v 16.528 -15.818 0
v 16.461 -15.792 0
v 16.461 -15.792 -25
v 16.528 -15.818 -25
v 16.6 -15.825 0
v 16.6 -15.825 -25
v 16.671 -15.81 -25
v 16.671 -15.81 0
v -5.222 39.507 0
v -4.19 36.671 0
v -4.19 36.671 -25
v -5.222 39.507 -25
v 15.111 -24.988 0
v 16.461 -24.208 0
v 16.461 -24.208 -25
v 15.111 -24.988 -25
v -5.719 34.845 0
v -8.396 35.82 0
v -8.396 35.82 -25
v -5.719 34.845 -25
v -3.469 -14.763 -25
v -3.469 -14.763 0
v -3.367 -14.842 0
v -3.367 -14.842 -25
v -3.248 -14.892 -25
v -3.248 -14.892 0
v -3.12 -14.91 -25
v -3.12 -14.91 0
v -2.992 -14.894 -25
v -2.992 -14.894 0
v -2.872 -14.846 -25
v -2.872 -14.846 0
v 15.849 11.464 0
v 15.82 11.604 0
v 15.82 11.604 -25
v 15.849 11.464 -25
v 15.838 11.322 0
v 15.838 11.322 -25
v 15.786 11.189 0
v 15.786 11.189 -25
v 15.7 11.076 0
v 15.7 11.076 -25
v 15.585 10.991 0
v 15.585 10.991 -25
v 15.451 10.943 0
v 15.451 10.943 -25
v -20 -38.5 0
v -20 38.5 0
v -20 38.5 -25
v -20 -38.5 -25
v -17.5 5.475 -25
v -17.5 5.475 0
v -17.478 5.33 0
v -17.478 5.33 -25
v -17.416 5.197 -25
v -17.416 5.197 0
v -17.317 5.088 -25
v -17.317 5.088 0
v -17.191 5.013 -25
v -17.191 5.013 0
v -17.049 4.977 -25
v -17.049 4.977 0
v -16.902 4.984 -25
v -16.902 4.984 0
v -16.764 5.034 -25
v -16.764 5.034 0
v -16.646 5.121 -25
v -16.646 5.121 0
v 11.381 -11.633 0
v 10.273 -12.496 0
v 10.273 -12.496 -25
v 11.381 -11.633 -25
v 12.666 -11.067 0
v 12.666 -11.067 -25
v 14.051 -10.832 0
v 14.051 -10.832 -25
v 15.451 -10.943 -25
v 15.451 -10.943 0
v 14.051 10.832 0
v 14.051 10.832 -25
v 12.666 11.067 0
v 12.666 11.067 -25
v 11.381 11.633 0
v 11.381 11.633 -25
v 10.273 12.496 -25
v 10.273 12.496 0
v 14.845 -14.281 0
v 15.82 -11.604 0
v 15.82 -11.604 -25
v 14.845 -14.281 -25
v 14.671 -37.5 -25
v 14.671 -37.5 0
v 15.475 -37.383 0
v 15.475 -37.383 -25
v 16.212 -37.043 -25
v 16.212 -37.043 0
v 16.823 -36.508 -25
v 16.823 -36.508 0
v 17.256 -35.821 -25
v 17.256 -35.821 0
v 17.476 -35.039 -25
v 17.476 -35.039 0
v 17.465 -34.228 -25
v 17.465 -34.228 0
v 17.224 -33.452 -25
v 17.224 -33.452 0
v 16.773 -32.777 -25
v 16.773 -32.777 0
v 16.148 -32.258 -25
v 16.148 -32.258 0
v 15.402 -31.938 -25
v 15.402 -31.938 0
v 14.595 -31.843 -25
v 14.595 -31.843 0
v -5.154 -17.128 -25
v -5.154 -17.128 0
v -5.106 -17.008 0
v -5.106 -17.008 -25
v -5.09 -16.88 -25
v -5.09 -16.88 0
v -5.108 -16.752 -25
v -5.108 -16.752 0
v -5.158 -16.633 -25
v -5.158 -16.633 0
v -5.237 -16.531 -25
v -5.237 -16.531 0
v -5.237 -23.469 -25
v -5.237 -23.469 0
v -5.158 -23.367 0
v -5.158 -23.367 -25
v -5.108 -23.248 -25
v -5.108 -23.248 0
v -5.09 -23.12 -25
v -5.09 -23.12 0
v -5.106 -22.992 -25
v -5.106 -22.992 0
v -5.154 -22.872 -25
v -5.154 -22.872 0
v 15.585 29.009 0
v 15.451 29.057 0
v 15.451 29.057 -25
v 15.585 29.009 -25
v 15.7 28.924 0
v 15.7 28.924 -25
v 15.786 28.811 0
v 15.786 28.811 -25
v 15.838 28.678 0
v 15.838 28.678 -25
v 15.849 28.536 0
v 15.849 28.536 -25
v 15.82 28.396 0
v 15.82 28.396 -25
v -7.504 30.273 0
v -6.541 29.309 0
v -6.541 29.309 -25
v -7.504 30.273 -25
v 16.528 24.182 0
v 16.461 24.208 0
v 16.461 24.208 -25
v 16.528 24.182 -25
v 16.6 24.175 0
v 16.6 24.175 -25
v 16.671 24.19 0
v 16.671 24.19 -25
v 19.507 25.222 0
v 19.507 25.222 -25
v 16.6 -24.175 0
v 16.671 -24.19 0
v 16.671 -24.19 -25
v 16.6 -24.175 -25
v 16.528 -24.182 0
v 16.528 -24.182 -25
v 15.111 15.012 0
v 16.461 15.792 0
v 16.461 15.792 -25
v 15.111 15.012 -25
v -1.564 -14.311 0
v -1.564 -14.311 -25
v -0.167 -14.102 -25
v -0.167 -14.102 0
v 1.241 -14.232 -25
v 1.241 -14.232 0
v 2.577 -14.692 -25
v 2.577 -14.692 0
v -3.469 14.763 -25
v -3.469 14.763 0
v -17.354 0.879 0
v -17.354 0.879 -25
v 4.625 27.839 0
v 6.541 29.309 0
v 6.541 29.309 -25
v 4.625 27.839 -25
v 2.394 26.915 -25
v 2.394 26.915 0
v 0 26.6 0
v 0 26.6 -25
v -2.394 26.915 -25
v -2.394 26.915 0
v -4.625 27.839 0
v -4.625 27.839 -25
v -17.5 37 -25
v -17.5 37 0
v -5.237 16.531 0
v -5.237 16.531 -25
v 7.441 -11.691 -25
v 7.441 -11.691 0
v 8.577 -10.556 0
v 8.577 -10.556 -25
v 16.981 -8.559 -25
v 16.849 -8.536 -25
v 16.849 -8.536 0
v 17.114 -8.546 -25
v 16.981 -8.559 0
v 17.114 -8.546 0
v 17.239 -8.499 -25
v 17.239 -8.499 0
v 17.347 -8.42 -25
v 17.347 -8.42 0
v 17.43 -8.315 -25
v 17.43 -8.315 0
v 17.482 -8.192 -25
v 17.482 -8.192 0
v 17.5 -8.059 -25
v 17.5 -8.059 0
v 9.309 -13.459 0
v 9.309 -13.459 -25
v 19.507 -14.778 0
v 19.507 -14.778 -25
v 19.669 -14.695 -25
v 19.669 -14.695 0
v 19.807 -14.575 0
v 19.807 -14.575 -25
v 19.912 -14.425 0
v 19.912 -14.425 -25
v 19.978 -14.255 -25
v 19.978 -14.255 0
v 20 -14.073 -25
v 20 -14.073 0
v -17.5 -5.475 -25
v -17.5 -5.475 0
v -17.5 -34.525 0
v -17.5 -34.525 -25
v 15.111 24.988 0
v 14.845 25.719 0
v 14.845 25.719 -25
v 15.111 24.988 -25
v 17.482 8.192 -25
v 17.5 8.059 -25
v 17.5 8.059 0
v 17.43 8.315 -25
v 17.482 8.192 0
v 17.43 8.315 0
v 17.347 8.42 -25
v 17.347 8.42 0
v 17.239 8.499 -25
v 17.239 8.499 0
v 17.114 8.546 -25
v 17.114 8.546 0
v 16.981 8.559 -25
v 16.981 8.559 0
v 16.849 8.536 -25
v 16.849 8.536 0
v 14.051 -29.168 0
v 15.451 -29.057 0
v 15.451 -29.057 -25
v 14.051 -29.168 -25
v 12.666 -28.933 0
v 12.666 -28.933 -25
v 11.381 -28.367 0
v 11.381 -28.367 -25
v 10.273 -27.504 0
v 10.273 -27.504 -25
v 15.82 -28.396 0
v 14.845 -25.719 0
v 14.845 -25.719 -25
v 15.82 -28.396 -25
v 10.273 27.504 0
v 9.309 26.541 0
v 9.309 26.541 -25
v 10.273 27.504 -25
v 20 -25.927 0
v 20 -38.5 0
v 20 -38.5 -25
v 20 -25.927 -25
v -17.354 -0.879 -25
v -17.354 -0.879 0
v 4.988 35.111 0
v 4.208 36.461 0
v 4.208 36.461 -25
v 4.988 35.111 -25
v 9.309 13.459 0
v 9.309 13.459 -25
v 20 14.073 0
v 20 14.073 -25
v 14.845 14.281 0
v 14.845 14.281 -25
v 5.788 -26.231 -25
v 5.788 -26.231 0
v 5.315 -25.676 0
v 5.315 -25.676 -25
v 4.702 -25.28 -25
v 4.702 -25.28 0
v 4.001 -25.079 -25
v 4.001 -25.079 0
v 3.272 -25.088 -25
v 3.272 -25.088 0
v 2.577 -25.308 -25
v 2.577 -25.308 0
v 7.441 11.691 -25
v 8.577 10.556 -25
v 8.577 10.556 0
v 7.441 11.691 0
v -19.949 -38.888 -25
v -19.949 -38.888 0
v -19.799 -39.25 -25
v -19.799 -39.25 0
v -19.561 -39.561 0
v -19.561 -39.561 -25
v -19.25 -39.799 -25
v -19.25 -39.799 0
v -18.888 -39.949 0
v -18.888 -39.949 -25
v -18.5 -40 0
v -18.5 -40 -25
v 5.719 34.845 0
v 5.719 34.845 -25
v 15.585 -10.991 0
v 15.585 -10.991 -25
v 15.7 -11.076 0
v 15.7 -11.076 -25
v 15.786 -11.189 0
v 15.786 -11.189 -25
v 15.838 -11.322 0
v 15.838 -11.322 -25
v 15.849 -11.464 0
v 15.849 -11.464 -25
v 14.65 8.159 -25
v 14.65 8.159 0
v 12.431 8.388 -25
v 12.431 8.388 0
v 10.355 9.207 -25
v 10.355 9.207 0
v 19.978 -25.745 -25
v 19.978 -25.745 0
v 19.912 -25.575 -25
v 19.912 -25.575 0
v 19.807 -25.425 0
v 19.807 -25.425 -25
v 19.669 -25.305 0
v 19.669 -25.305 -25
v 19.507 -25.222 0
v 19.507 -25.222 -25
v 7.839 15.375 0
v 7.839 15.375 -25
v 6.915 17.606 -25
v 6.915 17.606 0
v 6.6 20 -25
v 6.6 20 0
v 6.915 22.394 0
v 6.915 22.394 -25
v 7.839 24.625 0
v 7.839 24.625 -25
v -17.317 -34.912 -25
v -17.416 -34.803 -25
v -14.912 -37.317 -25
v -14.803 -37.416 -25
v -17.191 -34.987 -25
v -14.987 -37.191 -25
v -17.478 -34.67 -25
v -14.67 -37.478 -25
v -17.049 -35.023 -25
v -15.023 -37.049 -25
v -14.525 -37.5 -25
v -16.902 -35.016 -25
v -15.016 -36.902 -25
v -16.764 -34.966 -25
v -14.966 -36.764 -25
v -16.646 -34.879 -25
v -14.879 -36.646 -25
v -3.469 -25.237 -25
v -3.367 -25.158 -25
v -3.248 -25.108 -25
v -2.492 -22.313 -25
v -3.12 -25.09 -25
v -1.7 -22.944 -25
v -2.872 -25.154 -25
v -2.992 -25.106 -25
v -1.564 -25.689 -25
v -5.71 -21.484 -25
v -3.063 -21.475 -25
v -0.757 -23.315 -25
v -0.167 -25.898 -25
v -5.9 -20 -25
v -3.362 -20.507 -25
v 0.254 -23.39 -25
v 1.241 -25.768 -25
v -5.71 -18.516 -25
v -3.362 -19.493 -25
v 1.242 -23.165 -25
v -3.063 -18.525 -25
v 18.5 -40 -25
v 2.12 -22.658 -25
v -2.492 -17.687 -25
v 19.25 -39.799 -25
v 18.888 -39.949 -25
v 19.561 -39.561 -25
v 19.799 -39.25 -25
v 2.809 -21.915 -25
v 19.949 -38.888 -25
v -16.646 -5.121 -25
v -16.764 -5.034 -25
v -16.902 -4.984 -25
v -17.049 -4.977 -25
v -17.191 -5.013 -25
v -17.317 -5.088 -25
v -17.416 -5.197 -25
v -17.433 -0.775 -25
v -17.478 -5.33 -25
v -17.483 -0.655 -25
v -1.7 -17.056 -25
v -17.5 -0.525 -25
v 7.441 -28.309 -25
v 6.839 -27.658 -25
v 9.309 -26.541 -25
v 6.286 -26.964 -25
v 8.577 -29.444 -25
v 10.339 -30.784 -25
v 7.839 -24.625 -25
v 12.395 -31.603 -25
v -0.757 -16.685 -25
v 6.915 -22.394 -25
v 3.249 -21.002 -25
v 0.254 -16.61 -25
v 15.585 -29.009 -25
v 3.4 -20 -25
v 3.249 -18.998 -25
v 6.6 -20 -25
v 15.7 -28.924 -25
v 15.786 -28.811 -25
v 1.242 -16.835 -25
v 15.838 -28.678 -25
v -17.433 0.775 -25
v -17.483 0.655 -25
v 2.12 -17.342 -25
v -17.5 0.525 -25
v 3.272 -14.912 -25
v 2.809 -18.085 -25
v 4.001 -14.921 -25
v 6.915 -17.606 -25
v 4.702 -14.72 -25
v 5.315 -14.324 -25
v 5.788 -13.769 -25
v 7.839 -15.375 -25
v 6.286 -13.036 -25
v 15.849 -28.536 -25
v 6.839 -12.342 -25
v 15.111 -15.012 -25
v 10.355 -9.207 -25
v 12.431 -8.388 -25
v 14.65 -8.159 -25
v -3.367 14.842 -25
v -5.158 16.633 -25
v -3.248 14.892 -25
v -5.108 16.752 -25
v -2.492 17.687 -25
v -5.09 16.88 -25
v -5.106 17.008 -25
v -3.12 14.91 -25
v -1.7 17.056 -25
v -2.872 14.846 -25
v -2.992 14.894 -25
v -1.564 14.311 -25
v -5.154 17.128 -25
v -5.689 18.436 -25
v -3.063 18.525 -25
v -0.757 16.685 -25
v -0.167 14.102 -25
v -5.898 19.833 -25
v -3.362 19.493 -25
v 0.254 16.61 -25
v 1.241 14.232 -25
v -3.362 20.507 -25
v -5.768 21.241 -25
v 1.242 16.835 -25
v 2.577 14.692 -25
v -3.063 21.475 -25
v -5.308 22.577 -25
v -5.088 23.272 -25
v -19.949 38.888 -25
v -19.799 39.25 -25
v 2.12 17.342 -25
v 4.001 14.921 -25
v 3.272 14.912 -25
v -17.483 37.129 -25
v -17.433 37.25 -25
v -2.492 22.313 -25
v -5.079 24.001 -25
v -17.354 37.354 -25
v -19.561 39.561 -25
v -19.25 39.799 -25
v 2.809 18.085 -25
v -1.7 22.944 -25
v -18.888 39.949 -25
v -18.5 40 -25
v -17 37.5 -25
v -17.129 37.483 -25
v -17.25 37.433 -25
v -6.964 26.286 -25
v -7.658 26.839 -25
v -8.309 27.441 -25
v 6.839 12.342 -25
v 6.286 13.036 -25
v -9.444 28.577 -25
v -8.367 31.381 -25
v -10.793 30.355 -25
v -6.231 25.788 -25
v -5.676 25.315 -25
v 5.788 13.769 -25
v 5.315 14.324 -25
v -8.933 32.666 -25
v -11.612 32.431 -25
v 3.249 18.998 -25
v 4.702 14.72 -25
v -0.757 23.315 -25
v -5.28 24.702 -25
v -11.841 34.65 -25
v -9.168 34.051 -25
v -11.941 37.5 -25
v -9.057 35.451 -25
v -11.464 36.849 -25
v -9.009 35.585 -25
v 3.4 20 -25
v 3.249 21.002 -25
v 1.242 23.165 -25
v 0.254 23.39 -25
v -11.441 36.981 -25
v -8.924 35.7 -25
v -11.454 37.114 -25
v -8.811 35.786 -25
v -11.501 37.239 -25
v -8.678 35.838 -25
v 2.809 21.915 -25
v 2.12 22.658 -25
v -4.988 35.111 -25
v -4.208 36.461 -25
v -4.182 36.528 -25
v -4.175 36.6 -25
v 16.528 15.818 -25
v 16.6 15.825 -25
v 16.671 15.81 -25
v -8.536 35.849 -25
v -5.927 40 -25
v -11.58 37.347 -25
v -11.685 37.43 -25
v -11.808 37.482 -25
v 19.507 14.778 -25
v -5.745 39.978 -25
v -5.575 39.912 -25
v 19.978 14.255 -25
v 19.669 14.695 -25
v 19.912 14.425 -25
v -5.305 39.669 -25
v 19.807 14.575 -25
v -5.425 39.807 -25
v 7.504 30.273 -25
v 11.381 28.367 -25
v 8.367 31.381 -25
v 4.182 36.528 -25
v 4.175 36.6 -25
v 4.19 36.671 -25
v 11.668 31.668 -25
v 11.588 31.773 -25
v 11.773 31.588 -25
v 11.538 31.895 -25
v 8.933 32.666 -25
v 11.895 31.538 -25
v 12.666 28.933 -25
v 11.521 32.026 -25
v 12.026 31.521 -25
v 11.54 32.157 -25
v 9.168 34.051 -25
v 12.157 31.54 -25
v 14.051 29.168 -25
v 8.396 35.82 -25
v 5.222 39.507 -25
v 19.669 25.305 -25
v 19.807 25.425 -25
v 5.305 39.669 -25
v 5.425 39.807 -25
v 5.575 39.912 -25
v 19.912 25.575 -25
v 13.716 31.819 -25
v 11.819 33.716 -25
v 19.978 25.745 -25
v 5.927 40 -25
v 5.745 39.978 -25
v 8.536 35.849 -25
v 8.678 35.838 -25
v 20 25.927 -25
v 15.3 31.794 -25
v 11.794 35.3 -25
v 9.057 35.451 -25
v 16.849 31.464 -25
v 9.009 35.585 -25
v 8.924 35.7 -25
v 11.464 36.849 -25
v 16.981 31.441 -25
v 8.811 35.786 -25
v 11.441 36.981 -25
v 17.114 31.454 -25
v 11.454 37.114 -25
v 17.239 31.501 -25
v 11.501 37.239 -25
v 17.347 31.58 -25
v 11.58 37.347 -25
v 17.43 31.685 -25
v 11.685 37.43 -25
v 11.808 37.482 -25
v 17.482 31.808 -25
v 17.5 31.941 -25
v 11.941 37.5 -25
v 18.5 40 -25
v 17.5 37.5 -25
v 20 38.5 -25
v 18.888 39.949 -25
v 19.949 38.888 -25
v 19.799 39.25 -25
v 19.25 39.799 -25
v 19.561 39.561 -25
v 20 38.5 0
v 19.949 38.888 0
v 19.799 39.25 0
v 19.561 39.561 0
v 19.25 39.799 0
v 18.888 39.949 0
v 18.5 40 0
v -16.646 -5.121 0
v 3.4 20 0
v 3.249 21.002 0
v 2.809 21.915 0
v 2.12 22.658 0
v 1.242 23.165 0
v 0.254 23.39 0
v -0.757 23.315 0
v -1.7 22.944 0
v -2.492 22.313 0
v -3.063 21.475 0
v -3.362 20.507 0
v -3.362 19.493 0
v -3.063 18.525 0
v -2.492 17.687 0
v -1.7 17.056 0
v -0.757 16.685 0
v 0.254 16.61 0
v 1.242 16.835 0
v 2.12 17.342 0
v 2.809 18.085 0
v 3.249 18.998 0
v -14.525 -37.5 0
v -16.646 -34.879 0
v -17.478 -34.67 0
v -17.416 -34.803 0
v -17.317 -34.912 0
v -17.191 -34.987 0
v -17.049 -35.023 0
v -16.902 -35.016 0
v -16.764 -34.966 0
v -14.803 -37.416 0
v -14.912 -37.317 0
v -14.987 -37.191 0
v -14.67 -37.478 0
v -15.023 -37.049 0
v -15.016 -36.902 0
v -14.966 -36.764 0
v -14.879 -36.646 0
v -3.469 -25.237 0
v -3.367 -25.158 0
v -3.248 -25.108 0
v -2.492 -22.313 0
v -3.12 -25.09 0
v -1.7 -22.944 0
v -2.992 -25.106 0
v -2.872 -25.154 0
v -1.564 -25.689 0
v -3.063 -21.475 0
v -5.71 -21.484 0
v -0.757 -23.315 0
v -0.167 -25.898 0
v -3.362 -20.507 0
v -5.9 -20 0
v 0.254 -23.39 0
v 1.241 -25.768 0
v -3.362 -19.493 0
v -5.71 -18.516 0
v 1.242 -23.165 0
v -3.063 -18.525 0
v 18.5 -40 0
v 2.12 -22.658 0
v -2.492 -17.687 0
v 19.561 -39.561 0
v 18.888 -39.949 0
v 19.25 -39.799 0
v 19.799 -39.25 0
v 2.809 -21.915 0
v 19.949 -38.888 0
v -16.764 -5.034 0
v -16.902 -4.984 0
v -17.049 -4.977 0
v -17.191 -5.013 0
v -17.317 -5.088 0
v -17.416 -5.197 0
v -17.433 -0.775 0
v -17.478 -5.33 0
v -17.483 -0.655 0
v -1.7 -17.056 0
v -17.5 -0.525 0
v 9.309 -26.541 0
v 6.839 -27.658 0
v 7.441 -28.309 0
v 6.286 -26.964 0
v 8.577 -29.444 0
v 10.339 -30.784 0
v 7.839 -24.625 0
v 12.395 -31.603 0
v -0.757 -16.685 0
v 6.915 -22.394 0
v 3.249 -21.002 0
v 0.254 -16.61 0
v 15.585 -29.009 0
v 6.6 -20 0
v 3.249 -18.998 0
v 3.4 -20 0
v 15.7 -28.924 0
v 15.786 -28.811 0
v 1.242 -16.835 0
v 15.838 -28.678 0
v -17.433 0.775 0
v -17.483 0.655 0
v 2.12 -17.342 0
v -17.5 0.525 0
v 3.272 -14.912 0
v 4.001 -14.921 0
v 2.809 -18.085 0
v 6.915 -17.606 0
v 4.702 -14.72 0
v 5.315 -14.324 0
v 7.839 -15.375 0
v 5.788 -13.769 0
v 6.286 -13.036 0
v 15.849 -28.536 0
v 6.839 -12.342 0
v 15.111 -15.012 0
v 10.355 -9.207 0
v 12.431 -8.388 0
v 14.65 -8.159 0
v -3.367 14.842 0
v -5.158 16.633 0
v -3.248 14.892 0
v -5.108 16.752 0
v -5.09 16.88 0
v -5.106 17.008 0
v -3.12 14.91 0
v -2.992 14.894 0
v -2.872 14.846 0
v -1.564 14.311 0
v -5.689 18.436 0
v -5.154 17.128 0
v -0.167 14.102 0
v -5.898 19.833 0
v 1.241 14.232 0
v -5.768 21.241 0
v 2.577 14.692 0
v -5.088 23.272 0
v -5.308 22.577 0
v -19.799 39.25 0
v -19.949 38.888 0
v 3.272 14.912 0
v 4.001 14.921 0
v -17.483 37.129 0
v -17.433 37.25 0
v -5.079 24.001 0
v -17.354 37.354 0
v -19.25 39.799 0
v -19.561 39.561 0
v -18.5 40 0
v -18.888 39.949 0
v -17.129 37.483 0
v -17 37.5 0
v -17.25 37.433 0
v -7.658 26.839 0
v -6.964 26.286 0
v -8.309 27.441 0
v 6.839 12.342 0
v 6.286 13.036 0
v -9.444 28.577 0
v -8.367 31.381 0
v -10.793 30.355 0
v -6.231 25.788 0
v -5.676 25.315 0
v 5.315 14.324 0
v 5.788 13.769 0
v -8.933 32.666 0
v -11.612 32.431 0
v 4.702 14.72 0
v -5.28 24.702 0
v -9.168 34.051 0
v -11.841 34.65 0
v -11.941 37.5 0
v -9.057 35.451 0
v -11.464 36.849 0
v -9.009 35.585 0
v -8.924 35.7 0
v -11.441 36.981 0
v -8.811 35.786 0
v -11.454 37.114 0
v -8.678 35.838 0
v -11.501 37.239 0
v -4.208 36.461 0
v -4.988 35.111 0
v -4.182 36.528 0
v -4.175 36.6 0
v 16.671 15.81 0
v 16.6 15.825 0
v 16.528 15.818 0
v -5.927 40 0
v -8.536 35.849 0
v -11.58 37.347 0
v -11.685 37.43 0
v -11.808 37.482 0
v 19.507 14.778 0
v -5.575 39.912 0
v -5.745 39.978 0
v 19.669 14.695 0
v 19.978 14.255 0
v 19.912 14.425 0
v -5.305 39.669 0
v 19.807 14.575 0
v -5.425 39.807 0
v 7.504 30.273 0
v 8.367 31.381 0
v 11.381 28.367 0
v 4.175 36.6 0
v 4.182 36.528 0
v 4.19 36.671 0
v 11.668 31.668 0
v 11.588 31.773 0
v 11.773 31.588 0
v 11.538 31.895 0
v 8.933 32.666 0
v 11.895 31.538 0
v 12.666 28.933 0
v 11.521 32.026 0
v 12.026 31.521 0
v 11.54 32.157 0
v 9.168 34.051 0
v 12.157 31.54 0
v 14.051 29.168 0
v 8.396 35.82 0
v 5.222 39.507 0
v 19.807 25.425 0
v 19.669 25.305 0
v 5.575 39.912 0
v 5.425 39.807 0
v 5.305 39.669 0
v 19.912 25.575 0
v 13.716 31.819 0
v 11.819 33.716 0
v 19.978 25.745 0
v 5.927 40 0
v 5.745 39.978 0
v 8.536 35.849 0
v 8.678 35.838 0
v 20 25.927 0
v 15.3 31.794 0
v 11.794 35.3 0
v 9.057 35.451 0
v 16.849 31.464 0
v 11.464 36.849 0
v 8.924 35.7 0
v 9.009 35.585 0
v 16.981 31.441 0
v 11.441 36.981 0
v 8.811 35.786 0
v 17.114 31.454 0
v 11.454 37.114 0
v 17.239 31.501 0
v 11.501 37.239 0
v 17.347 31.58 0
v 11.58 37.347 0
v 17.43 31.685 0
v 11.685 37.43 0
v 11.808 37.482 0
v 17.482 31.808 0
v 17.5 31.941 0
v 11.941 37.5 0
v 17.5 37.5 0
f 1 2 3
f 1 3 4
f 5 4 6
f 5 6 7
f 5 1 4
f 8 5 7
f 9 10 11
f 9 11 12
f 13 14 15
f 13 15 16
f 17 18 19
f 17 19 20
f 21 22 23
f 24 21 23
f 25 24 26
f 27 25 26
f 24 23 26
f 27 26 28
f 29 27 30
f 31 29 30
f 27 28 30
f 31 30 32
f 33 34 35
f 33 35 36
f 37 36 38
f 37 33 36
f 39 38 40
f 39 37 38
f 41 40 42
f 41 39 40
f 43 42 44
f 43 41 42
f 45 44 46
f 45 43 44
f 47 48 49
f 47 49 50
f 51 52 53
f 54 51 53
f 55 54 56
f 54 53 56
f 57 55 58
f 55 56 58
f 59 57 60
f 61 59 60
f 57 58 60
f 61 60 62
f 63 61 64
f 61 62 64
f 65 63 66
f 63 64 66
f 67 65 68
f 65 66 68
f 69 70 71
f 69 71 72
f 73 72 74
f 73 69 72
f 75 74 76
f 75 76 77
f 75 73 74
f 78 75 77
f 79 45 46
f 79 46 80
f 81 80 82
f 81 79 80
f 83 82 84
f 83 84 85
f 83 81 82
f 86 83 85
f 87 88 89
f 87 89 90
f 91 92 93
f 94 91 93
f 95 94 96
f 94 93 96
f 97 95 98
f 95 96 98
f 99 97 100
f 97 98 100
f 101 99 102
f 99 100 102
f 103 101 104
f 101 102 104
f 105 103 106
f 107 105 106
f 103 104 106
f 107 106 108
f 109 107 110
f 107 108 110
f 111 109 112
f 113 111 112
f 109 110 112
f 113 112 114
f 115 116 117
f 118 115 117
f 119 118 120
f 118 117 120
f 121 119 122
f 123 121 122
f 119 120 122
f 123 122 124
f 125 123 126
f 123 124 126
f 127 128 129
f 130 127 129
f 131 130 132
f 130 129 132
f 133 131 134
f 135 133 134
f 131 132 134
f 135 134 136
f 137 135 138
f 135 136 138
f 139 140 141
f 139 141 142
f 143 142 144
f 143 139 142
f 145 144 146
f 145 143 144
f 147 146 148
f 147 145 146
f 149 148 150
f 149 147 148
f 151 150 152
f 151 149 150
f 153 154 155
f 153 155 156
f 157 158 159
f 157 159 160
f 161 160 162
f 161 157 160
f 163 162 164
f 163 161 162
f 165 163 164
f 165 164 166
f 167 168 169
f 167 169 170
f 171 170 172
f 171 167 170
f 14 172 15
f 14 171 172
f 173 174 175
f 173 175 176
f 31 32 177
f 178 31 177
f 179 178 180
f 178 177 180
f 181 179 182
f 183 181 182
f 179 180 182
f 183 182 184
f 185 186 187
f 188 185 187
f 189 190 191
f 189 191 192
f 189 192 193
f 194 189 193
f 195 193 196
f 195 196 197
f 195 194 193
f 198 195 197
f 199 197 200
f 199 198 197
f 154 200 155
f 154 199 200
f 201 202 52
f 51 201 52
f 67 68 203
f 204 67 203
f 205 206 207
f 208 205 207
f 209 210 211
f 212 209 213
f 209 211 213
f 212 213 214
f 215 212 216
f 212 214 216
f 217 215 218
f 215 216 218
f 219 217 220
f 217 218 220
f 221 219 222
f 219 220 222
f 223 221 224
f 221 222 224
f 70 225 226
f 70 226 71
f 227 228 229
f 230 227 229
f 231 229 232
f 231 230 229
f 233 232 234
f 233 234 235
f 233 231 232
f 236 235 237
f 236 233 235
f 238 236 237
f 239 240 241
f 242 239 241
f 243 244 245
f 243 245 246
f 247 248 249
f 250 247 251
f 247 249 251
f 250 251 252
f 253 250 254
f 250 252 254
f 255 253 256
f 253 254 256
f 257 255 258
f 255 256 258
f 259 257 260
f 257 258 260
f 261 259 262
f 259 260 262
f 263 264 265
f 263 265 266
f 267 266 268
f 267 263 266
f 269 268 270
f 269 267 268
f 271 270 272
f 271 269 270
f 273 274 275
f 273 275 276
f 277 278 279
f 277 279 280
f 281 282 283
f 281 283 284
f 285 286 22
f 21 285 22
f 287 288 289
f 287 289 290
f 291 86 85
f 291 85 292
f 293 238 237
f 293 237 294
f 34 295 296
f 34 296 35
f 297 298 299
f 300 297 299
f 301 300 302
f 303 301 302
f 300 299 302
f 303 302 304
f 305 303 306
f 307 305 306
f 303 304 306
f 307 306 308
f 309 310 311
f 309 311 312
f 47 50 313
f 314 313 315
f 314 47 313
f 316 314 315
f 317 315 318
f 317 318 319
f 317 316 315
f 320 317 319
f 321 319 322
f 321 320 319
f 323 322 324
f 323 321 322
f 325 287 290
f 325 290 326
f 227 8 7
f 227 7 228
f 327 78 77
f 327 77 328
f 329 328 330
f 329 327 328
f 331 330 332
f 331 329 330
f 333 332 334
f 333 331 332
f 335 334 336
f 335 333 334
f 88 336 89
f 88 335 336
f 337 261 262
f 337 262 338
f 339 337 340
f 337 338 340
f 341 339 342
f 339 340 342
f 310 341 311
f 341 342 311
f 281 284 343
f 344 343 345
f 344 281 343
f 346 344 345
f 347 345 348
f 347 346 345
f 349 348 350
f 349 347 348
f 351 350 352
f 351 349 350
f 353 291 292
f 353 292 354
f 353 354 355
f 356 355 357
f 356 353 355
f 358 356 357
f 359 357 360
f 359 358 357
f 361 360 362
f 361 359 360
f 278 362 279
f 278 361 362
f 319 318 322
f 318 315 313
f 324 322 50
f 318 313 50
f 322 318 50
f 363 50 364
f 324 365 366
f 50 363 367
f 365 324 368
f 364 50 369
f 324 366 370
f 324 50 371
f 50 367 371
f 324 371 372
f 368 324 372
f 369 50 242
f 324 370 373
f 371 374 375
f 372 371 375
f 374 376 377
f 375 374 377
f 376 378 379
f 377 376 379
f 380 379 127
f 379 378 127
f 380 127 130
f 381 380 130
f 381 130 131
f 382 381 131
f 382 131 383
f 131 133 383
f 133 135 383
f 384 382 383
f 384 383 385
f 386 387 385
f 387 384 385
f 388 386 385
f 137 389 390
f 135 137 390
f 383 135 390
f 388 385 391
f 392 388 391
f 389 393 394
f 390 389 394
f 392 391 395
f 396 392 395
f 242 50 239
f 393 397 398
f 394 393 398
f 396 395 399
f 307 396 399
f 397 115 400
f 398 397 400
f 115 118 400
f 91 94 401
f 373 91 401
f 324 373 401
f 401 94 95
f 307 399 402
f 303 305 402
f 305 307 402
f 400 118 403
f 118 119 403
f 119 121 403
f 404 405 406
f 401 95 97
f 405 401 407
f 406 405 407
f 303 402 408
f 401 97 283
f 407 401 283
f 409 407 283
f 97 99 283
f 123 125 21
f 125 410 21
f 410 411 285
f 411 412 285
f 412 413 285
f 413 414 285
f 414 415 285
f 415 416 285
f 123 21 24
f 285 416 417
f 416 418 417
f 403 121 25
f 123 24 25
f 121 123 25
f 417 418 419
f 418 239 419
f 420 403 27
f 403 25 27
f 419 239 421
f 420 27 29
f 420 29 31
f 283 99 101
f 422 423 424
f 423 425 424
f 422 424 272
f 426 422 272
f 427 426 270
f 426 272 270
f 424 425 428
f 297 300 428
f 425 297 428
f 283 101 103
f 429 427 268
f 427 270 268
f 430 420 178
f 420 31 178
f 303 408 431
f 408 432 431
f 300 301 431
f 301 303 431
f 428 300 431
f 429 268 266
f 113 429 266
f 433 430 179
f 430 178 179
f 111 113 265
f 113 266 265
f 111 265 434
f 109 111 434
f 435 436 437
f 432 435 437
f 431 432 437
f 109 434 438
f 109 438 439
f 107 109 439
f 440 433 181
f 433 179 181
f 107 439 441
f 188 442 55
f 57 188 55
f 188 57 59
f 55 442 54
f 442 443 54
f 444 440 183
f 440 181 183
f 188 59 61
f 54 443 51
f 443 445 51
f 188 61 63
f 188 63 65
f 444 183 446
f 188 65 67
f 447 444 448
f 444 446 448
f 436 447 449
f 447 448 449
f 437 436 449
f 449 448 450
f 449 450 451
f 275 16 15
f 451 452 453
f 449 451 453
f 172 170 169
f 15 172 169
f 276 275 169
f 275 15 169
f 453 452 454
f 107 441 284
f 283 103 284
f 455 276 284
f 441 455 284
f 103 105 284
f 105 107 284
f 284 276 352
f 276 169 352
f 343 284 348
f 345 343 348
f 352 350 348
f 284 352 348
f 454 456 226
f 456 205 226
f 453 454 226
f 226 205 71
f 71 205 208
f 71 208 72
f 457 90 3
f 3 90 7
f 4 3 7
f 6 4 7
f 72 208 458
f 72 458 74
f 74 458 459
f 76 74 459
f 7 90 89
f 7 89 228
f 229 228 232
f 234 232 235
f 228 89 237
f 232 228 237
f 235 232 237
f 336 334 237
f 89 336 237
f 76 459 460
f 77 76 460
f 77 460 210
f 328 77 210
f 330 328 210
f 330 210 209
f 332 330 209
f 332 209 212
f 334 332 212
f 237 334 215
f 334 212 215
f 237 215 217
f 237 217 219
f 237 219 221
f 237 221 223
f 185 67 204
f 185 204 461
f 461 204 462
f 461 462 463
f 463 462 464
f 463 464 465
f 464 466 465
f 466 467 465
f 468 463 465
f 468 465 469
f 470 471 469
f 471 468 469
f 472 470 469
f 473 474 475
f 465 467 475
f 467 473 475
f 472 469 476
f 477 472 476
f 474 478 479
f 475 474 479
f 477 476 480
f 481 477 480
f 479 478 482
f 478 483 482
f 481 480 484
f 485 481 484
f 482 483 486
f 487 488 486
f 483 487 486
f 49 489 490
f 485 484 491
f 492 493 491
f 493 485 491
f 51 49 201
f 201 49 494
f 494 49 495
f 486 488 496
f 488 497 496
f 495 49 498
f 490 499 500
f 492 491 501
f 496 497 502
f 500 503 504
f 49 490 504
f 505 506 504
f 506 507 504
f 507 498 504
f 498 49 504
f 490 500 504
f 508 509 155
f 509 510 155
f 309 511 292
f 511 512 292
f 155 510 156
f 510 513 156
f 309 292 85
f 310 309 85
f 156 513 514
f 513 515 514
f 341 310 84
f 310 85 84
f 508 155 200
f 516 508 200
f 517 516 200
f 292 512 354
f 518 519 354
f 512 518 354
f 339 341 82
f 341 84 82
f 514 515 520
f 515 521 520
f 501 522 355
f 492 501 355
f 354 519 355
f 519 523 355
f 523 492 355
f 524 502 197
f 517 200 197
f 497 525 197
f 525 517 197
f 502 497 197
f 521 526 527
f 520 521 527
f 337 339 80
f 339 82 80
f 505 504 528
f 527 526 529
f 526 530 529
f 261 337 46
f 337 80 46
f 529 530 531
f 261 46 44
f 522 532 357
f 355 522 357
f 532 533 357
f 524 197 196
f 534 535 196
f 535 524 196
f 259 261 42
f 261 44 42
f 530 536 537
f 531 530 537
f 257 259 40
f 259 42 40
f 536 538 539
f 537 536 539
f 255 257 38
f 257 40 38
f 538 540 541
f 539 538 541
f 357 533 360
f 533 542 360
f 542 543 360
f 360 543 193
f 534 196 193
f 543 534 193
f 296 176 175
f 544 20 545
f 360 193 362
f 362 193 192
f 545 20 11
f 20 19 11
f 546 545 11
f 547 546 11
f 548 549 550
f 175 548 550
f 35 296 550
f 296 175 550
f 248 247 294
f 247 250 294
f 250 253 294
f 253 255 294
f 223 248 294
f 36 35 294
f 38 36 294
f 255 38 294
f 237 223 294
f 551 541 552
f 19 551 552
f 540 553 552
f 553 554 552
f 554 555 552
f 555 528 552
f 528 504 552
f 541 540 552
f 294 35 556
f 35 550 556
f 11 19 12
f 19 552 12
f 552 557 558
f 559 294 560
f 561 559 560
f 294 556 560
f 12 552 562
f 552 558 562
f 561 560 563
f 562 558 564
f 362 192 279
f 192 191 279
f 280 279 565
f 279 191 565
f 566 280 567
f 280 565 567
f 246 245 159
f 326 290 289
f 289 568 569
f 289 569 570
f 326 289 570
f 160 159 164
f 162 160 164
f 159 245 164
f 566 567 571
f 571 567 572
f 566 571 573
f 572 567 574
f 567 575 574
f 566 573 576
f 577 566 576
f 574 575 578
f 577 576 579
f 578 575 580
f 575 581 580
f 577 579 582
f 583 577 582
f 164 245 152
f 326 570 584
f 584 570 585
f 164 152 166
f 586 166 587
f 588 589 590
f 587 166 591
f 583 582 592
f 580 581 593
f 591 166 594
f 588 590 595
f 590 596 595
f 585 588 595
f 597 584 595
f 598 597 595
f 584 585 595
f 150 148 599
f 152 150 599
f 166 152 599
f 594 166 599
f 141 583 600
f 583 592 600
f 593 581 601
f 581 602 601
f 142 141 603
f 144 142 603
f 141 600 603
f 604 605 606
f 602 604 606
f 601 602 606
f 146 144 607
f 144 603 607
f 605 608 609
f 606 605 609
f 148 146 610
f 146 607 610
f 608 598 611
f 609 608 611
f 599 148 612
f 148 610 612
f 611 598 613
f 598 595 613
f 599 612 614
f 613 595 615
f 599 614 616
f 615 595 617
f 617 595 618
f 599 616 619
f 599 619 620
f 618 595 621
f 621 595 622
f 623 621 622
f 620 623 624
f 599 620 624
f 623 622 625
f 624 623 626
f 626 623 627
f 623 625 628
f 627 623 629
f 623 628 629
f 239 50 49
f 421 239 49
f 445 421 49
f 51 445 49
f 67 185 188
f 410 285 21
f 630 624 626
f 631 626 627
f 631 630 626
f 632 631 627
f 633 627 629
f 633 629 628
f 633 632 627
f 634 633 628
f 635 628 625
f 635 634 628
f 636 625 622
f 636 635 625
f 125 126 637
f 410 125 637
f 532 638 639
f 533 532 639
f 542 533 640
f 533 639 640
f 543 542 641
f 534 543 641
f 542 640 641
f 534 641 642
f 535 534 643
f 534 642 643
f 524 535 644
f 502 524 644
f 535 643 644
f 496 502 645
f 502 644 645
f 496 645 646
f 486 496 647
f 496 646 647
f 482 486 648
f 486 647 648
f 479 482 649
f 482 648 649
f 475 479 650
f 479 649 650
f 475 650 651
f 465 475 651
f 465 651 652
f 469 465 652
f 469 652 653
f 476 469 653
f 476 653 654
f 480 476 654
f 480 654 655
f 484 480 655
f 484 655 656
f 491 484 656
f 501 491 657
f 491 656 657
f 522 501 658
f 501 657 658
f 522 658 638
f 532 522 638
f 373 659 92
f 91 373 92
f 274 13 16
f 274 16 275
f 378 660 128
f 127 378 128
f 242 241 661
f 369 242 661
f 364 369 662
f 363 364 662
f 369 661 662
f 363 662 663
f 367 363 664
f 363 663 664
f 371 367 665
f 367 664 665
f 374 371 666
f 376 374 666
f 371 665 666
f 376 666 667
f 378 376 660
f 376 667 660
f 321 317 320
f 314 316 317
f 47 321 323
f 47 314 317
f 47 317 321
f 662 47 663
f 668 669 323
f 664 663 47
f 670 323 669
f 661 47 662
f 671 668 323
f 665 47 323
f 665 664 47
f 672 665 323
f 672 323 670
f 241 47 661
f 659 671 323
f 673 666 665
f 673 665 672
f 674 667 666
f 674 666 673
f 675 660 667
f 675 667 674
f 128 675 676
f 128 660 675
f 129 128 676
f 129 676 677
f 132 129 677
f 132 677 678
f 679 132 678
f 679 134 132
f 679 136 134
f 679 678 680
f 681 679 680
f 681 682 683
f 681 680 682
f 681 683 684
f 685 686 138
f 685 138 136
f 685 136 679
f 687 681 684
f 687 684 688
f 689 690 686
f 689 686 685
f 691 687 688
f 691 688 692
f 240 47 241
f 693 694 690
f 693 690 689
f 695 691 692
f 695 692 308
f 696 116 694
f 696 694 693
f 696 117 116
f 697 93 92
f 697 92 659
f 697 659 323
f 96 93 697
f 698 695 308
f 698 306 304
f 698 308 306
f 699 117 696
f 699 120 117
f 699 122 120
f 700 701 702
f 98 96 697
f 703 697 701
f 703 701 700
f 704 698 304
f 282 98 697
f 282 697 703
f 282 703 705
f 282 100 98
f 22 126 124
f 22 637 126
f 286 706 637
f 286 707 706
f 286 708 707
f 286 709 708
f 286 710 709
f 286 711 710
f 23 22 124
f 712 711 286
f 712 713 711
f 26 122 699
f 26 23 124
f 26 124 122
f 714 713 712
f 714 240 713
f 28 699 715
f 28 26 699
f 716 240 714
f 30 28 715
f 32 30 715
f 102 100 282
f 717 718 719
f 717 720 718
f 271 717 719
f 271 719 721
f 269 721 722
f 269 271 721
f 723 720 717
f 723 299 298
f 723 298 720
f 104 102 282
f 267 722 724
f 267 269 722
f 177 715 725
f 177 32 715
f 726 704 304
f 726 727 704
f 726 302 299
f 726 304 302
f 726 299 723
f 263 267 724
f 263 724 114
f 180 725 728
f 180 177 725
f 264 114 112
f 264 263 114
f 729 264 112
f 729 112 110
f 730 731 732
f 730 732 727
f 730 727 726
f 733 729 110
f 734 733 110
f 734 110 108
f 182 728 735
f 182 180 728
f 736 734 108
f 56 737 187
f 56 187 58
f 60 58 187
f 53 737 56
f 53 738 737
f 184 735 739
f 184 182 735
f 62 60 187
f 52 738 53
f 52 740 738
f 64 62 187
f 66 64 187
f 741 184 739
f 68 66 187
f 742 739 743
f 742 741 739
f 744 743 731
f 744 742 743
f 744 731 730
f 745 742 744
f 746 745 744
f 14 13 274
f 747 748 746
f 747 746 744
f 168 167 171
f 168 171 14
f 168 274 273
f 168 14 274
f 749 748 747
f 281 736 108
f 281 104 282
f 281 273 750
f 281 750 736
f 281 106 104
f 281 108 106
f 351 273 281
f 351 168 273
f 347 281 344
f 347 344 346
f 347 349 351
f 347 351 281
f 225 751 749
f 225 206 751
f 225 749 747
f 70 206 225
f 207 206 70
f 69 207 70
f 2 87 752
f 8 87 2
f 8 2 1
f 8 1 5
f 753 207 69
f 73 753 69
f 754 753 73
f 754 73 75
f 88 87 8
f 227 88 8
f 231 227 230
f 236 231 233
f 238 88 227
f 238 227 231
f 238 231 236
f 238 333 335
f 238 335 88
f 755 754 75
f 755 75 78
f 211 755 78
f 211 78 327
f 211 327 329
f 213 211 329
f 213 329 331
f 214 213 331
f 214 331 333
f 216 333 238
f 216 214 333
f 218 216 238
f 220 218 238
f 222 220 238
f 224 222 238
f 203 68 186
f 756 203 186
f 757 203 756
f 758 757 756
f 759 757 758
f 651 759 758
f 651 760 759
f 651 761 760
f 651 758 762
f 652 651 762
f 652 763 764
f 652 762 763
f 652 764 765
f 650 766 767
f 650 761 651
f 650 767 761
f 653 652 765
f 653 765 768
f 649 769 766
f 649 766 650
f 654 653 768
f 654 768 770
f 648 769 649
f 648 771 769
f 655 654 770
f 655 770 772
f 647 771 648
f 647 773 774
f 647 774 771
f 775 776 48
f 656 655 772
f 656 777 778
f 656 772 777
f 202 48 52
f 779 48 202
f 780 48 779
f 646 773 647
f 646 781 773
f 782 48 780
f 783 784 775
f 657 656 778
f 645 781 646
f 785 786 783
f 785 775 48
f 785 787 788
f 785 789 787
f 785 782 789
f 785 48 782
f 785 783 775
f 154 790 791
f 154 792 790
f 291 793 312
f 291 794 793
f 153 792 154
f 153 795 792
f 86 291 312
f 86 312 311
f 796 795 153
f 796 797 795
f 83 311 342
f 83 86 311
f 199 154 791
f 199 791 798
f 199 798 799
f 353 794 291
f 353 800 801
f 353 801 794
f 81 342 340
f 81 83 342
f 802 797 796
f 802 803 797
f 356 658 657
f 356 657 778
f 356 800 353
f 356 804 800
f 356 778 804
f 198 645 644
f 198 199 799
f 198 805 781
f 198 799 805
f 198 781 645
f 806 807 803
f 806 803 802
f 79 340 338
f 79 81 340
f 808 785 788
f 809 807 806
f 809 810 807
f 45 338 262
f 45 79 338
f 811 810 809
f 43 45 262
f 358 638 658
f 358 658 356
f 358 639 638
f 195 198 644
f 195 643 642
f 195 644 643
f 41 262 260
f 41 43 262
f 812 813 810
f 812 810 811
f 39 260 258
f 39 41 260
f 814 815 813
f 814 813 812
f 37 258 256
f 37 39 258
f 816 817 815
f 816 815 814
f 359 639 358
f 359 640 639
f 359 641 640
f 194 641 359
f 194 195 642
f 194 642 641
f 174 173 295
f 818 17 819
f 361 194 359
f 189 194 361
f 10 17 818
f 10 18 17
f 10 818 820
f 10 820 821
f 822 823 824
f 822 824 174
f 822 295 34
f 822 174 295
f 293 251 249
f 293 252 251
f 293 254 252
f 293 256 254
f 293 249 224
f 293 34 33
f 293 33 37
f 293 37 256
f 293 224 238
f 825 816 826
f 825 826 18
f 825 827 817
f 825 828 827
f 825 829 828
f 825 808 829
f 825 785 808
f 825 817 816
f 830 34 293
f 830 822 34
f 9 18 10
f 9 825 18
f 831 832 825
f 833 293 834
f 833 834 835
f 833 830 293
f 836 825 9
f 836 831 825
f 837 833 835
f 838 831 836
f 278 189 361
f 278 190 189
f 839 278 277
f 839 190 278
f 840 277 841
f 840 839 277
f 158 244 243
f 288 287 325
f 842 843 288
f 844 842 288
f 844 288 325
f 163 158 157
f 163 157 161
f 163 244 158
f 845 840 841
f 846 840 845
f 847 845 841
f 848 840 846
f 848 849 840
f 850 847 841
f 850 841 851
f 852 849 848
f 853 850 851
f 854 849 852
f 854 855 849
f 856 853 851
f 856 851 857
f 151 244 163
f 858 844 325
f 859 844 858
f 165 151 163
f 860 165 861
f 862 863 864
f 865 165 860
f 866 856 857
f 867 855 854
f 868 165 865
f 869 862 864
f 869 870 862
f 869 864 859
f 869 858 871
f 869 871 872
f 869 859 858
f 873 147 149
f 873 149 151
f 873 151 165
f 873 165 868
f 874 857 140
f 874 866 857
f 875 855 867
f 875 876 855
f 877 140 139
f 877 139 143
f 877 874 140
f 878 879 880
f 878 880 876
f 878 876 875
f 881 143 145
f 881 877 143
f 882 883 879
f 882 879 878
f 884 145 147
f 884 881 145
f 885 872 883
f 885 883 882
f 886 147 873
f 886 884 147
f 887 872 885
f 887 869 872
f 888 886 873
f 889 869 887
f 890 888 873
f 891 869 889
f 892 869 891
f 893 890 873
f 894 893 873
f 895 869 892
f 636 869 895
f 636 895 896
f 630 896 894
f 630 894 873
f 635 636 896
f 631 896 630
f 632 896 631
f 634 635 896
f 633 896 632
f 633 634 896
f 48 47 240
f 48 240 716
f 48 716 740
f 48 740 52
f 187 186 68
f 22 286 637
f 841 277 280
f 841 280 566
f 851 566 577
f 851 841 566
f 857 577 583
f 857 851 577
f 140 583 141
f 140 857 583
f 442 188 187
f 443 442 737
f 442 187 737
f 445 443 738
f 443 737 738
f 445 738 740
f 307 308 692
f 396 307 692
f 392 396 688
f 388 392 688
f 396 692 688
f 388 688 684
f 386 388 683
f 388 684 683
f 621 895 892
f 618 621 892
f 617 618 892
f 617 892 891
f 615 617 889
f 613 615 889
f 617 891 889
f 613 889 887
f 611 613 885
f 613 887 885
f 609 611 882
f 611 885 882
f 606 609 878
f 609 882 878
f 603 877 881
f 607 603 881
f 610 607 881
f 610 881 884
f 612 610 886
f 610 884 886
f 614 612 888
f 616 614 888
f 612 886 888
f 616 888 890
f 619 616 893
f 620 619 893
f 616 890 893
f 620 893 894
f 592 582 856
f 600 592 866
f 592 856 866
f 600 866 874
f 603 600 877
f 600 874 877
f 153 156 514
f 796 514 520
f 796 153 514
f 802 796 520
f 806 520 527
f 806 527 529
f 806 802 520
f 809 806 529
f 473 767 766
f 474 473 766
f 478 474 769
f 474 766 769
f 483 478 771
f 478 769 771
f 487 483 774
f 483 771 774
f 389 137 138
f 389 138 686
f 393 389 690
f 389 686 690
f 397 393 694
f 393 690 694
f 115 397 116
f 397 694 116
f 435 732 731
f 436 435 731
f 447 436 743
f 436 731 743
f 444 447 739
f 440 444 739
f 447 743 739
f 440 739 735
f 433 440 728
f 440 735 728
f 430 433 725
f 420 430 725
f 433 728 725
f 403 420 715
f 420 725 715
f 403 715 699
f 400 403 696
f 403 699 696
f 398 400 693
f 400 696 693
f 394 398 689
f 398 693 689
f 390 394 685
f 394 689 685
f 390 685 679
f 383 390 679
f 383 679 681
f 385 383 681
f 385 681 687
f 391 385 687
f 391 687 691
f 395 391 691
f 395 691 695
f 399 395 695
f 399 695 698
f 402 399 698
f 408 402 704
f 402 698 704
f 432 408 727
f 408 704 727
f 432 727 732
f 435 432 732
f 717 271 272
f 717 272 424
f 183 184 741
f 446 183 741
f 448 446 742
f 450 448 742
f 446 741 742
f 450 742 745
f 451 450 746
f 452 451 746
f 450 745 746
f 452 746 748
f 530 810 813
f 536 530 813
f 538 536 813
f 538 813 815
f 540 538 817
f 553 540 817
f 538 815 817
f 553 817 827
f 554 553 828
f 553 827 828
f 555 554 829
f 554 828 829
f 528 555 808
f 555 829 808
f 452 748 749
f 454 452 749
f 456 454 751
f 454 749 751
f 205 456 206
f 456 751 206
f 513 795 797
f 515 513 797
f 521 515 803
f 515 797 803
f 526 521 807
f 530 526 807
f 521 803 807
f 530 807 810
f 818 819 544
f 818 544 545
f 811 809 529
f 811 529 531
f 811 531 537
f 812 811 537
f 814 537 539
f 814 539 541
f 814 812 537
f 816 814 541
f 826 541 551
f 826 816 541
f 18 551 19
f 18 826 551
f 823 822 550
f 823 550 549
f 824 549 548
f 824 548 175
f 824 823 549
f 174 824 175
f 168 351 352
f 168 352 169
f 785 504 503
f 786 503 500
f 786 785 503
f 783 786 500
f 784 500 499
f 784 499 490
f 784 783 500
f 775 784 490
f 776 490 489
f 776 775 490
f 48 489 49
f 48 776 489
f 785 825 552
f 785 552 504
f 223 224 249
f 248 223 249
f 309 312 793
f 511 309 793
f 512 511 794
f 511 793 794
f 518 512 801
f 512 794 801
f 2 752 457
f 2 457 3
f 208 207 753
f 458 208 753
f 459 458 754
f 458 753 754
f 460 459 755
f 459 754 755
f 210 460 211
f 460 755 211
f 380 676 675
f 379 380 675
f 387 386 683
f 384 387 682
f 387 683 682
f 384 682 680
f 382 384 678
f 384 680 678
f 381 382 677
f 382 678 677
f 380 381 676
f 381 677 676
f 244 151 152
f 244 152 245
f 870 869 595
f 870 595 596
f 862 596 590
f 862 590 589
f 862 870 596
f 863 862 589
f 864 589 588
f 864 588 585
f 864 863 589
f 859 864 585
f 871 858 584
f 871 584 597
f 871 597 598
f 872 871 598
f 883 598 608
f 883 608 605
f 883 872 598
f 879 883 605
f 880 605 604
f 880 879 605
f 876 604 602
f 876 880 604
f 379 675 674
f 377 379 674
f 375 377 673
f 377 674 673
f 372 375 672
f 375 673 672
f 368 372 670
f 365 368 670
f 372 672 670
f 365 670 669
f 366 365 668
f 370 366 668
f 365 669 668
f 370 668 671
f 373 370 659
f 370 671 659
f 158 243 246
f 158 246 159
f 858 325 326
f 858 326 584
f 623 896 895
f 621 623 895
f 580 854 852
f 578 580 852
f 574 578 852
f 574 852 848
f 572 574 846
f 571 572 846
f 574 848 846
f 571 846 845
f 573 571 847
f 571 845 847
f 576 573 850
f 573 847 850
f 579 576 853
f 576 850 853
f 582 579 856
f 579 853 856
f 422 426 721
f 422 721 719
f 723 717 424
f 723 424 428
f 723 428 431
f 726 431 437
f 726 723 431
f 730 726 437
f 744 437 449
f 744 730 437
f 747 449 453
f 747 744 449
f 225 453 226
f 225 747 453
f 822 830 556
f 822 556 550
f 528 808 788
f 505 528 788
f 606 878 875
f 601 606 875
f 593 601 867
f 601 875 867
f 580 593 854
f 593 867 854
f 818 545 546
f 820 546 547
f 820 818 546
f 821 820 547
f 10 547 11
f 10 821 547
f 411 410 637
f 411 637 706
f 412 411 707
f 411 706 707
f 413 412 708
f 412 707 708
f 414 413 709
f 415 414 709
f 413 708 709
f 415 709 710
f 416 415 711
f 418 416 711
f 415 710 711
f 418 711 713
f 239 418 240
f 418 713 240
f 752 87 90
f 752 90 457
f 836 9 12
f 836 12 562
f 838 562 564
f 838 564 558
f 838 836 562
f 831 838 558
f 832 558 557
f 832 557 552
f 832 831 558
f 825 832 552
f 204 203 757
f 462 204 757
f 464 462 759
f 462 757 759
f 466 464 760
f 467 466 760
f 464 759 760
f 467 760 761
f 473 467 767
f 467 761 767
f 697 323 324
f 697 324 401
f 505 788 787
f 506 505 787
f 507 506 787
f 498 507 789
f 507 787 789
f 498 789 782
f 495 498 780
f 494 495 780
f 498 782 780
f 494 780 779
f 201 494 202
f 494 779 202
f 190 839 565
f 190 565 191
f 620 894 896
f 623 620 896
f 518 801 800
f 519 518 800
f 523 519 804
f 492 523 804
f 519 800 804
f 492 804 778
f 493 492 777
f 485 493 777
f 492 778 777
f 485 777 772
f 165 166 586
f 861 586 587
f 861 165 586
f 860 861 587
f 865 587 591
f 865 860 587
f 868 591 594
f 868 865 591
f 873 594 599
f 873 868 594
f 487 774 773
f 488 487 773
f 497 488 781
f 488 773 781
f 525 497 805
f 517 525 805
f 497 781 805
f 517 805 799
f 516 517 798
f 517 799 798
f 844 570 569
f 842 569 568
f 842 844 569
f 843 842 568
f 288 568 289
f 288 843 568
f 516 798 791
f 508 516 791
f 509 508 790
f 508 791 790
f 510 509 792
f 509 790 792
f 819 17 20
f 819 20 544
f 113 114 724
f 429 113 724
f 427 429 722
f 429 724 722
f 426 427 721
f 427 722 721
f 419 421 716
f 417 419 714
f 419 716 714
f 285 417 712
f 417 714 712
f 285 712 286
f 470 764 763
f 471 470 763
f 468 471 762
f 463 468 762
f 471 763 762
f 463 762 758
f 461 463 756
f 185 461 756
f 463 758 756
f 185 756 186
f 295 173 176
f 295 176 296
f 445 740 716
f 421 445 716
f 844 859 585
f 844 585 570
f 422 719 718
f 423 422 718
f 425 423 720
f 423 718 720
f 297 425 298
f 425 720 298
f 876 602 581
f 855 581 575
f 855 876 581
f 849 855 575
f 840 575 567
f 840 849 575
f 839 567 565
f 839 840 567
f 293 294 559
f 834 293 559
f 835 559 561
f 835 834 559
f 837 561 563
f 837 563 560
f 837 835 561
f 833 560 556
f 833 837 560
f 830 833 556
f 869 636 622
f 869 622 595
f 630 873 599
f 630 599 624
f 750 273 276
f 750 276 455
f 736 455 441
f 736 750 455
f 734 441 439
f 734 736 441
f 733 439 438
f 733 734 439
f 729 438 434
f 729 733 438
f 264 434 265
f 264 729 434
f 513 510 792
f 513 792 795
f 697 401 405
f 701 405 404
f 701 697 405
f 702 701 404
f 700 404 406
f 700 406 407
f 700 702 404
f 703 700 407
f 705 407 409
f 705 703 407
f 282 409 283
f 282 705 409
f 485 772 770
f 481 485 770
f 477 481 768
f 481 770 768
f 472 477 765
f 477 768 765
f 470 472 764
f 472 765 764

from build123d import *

# Parameters (mm, degrees)
SK_MAIN_EXTRUSION_R  = 3.4
MAIN_EXTRUSION_DEPTH = 25


with BuildPart() as part:
    # Sk Main Extrusion → Main Extrusion (new body)
    with BuildSketch(Plane.XY):
        with BuildLine():
            Line((16.671180212, -15.809923155), (19.506515107, -14.777945649))
            ThreePointArc((19.506515107, -14.777945649), (19.864364033, -14.503358511), (20, -14.073176184))
            Line((20, -14.073176184), (20, 14.073176184))
            ThreePointArc((20, 14.073176184), (19.864364033, 14.503358511), (19.506515107, 14.777945649))
            Line((19.506515107, 14.777945649), (16.671180212, 15.809923155))
            ThreePointArc((16.671180212, 15.809923155), (16.563886241, 15.824048675), (16.460675177, 15.791506351))
            Line((16.460675177, 15.791506351), (15.111296024, 15.012441934))
            Line((15.111296024, 15.012441934), (14.845251581, 14.281490834))
            Line((14.845251581, 14.281490834), (15.81984631, 11.603813821))
            ThreePointArc((15.81984631, 11.603813821), (15.786489799, 11.188925388), (15.450654467, 10.943039849))
            ThreePointArc((15.450654467, 10.943039849), (12.665882372, 11.066566987), (10.272684887, 12.495839661))
            Line((10.272684887, 12.495839661), (9.309262274, 13.459262274))
            ThreePointArc((9.309262274, 13.459262274), (6.6, 20), (9.309262274, 26.540737726))
            Line((9.309262274, 26.540737726), (10.272684887, 27.504160339))
            ThreePointArc((10.272684887, 27.504160339), (12.665882372, 28.933433013), (15.450654467, 29.056960151))
            ThreePointArc((15.450654467, 29.056960151), (15.786489799, 28.811074612), (15.81984631, 28.396186179))
            Line((15.81984631, 28.396186179), (14.845251581, 25.718509166))
            Line((14.845251581, 25.718509166), (15.111296024, 24.987558066))
            Line((15.111296024, 24.987558066), (16.460675177, 24.208493649))
            ThreePointArc((16.460675177, 24.208493649), (16.563886241, 24.175951325), (16.671180212, 24.190076845))
            Line((16.671180212, 24.190076845), (19.506515107, 25.222054351))
            ThreePointArc((19.506515107, 25.222054351), (19.864364033, 25.496641489), (20, 25.926823816))
            Line((20, 25.926823816), (20, 38.5))
            ThreePointArc((20, 38.5), (19.560660172, 39.560660172), (18.5, 40))
            Line((18.5, 40), (5.926823816, 40))
            ThreePointArc((5.926823816, 40), (5.496641489, 39.864364033), (5.222054351, 39.506515107))
            Line((5.222054351, 39.506515107), (4.190076845, 36.671180212))
            ThreePointArc((4.190076845, 36.671180212), (4.175951325, 36.563886241), (4.208493649, 36.460675177))
            Line((4.208493649, 36.460675177), (4.987558066, 35.111296024))
            Line((4.987558066, 35.111296024), (5.718509166, 34.845251581))
            Line((5.718509166, 34.845251581), (8.396186179, 35.81984631))
            ThreePointArc((8.396186179, 35.81984631), (8.811074612, 35.786489799), (9.056960151, 35.450654467))
            ThreePointArc((9.056960151, 35.450654467), (8.933433013, 32.665882372), (7.504160339, 30.272684887))
            Line((7.504160339, 30.272684887), (6.540737726, 29.309262274))
            ThreePointArc((6.540737726, 29.309262274), (0, 26.6), (-6.540737726, 29.309262274))
            Line((-6.540737726, 29.309262274), (-7.504160339, 30.272684887))
            ThreePointArc((-7.504160339, 30.272684887), (-8.933433013, 32.665882372), (-9.056960151, 35.450654467))
            ThreePointArc((-9.056960151, 35.450654467), (-8.811074612, 35.786489799), (-8.396186179, 35.81984631))
            Line((-8.396186179, 35.81984631), (-5.718509166, 34.845251581))
            Line((-5.718509166, 34.845251581), (-4.987558066, 35.111296024))
            Line((-4.987558066, 35.111296024), (-4.208493649, 36.460675177))
            ThreePointArc((-4.208493649, 36.460675177), (-4.175951325, 36.563886241), (-4.190076845, 36.671180212))
            Line((-4.190076845, 36.671180212), (-5.222054351, 39.506515107))
            ThreePointArc((-5.222054351, 39.506515107), (-5.496641489, 39.864364033), (-5.926823816, 40))
            Line((-5.926823816, 40), (-18.5, 40))
            ThreePointArc((-18.5, 40), (-19.560660172, 39.560660172), (-20, 38.5))
            Line((-20, 38.5), (-20, -38.5))
            ThreePointArc((-20, -38.5), (-19.560660172, -39.560660172), (-18.5, -40))
            Line((-18.5, -40), (18.5, -40))
            ThreePointArc((18.5, -40), (19.560660172, -39.560660172), (20, -38.5))
            Line((20, -38.5), (20, -25.926823816))
            ThreePointArc((20, -25.926823816), (19.864364033, -25.496641489), (19.506515107, -25.222054351))
            Line((19.506515107, -25.222054351), (16.671180212, -24.190076845))
            ThreePointArc((16.671180212, -24.190076845), (16.563886241, -24.175951325), (16.460675177, -24.208493649))
            Line((16.460675177, -24.208493649), (15.111296024, -24.987558066))
            Line((15.111296024, -24.987558066), (14.845251581, -25.718509166))
            Line((14.845251581, -25.718509166), (15.81984631, -28.396186179))
            ThreePointArc((15.81984631, -28.396186179), (15.786489799, -28.811074612), (15.450654467, -29.056960151))
            ThreePointArc((15.450654467, -29.056960151), (12.665882372, -28.933433013), (10.272684887, -27.504160339))
            Line((10.272684887, -27.504160339), (9.309262274, -26.540737726))
            ThreePointArc((9.309262274, -26.540737726), (6.6, -20), (9.309262274, -13.459262274))
            Line((9.309262274, -13.459262274), (10.272684887, -12.495839661))
            ThreePointArc((10.272684887, -12.495839661), (12.665882372, -11.066566987), (15.450654467, -10.943039849))
            ThreePointArc((15.450654467, -10.943039849), (15.786489799, -11.188925388), (15.81984631, -11.603813821))
            Line((15.81984631, -11.603813821), (14.845251581, -14.281490834))
            Line((14.845251581, -14.281490834), (15.111296024, -15.012441934))
            Line((15.111296024, -15.012441934), (16.460675177, -15.791506351))
            ThreePointArc((16.460675177, -15.791506351), (16.563886241, -15.824048675), (16.671180212, -15.809923155))
        make_face()
        with Locations((0, -20)):
            Circle(SK_MAIN_EXTRUSION_R, mode=Mode.SUBTRACT)
        with Locations((0, 20)):
            Circle(SK_MAIN_EXTRUSION_R, mode=Mode.SUBTRACT)
        with BuildLine():
            Line((-17.5, 37), (-17.5, 5.474873734))
            ThreePointArc((-17.5, 5.474873734), (-17.191341716, 5.012933968), (-16.646446609, 5.121320344))
            Line((-16.646446609, 5.121320344), (-5.236899672, 16.530867281))
            ThreePointArc((-5.236899672, 16.530867281), (-5.095239754, 16.81540054), (-5.153698917, 17.127825306))
            ThreePointArc((-5.153698917, 17.127825306), (-5.897648575, 19.833442852), (-5.307583096, 22.576734694))
            ThreePointArc((-5.307583096, 22.576734694), (-5.153883821, 24.359333373), (-6.230846881, 25.788120301))
            ThreePointArc((-6.230846881, 25.788120301), (-7.316529108, 26.555931161), (-8.308504679, 27.441495321))
            Line((-8.308504679, 27.441495321), (-9.444282589, 28.577273231))
            ThreePointArc((-9.444282589, 28.577273231), (-11.611987193, 32.430514315), (-11.464011904, 36.849169473))
            ThreePointArc((-11.464011904, 36.849169473), (-11.537349181, 37.295452819), (-11.940719521, 37.5))
            Line((-11.940719521, 37.5), (-17, 37.5))
            ThreePointArc((-17, 37.5), (-17.353553391, 37.353553391), (-17.5, 37))
        make_face(mode=Mode.SUBTRACT)
        with BuildLine():
            Line((-3.469132719, 14.763100328), (-17.353553391, 0.878679656))
            ThreePointArc((-17.353553391, 0.878679656), (-17.461939766, 0.716467982), (-17.5, 0.525126266))
            Line((-17.5, 0.525126266), (-17.5, -0.525126266))
            ThreePointArc((-17.5, -0.525126266), (-17.461939766, -0.716467982), (-17.353553391, -0.878679656))
            Line((-17.353553391, -0.878679656), (-3.469132719, -14.763100328))
            ThreePointArc((-3.469132719, -14.763100328), (-3.18459946, -14.904760246), (-2.872174694, -14.846301083))
            ThreePointArc((-2.872174694, -14.846301083), (-0.166557148, -14.102351425), (2.576734694, -14.692416904))
            ThreePointArc((2.576734694, -14.692416904), (4.359333373, -14.846116179), (5.788120301, -13.769153119))
            ThreePointArc((5.788120301, -13.769153119), (6.555931161, -12.683470892), (7.441495321, -11.691495321))
            Line((7.441495321, -11.691495321), (8.577273231, -10.555717411))
            ThreePointArc((8.577273231, -10.555717411), (12.430514315, -8.388012807), (16.849169473, -8.535988096))
            ThreePointArc((16.849169473, -8.535988096), (17.295452819, -8.462650819), (17.5, -8.059280479))
            Line((17.5, -8.059280479), (17.5, 8.059280479))
            ThreePointArc((17.5, 8.059280479), (17.295452819, 8.462650819), (16.849169473, 8.535988096))
            ThreePointArc((16.849169473, 8.535988096), (12.430514315, 8.388012807), (8.577273231, 10.555717411))
            Line((8.577273231, 10.555717411), (7.441495321, 11.691495321))
            ThreePointArc((7.441495321, 11.691495321), (6.555931161, 12.683470892), (5.788120301, 13.769153119))
            ThreePointArc((5.788120301, 13.769153119), (4.359333373, 14.846116179), (2.576734694, 14.692416904))
            ThreePointArc((2.576734694, 14.692416904), (-0.166557148, 14.102351425), (-2.872174694, 14.846301083))
            ThreePointArc((-2.872174694, 14.846301083), (-3.18459946, 14.904760246), (-3.469132719, 14.763100328))
        make_face(mode=Mode.SUBTRACT)
        with BuildLine():
            Line((-17.5, -5.474873734), (-17.5, -34.525126266))
            ThreePointArc((-17.5, -34.525126266), (-17.191341716, -34.987066032), (-16.646446609, -34.878679656))
            Line((-16.646446609, -34.878679656), (-5.236899672, -23.469132719))
            ThreePointArc((-5.236899672, -23.469132719), (-5.095239754, -23.18459946), (-5.153698917, -22.872174694))
            ThreePointArc((-5.153698917, -22.872174694), (-5.9, -20), (-5.153698917, -17.127825306))
            ThreePointArc((-5.153698917, -17.127825306), (-5.095239754, -16.81540054), (-5.236899672, -16.530867281))
            Line((-5.236899672, -16.530867281), (-16.646446609, -5.121320344))
            ThreePointArc((-16.646446609, -5.121320344), (-17.191341716, -5.012933968), (-17.5, -5.474873734))
        make_face(mode=Mode.SUBTRACT)
        with BuildLine():
            Line((-3.469132719, -25.236899672), (-14.878679656, -36.646446609))
            ThreePointArc((-14.878679656, -36.646446609), (-14.987066032, -37.191341716), (-14.525126266, -37.5))
            Line((-14.525126266, -37.5), (14.67102413, -37.5))
            ThreePointArc((14.67102413, -37.5), (17.499746132, -34.633125439), (14.59523355, -31.843063688))
            ThreePointArc((14.59523355, -31.843063688), (11.339316504, -31.263177929), (8.577273231, -29.444282589))
            Line((8.577273231, -29.444282589), (7.441495321, -28.308504679))
            ThreePointArc((7.441495321, -28.308504679), (6.555931161, -27.316529108), (5.788120301, -26.230846881))
            ThreePointArc((5.788120301, -26.230846881), (4.359333373, -25.153883821), (2.576734694, -25.307583096))
            ThreePointArc((2.576734694, -25.307583096), (-0.166557148, -25.897648575), (-2.872174694, -25.153698917))
            ThreePointArc((-2.872174694, -25.153698917), (-3.18459946, -25.095239754), (-3.469132719, -25.236899672))
        make_face(mode=Mode.SUBTRACT)
        with BuildLine():
            Line((17.5, 31.940719521), (17.5, 37.5))
            Line((17.5, 37.5), (11.940719521, 37.5))
            ThreePointArc((11.940719521, 37.5), (11.537349181, 37.295452819), (11.464011904, 36.849169473))
            ThreePointArc((11.464011904, 36.849169473), (11.844928721, 34.508523804), (11.540116235, 32.156756572))
            ThreePointArc((11.540116235, 32.156756572), (11.66791097, 31.66791097), (12.156756572, 31.540116235))
            ThreePointArc((12.156756572, 31.540116235), (14.508523804, 31.844928721), (16.849169473, 31.464011904))
            ThreePointArc((16.849169473, 31.464011904), (17.295452819, 31.537349181), (17.5, 31.940719521))
        make_face(mode=Mode.SUBTRACT)
    extrude(amount=-MAIN_EXTRUSION_DEPTH)


solid = part.part
